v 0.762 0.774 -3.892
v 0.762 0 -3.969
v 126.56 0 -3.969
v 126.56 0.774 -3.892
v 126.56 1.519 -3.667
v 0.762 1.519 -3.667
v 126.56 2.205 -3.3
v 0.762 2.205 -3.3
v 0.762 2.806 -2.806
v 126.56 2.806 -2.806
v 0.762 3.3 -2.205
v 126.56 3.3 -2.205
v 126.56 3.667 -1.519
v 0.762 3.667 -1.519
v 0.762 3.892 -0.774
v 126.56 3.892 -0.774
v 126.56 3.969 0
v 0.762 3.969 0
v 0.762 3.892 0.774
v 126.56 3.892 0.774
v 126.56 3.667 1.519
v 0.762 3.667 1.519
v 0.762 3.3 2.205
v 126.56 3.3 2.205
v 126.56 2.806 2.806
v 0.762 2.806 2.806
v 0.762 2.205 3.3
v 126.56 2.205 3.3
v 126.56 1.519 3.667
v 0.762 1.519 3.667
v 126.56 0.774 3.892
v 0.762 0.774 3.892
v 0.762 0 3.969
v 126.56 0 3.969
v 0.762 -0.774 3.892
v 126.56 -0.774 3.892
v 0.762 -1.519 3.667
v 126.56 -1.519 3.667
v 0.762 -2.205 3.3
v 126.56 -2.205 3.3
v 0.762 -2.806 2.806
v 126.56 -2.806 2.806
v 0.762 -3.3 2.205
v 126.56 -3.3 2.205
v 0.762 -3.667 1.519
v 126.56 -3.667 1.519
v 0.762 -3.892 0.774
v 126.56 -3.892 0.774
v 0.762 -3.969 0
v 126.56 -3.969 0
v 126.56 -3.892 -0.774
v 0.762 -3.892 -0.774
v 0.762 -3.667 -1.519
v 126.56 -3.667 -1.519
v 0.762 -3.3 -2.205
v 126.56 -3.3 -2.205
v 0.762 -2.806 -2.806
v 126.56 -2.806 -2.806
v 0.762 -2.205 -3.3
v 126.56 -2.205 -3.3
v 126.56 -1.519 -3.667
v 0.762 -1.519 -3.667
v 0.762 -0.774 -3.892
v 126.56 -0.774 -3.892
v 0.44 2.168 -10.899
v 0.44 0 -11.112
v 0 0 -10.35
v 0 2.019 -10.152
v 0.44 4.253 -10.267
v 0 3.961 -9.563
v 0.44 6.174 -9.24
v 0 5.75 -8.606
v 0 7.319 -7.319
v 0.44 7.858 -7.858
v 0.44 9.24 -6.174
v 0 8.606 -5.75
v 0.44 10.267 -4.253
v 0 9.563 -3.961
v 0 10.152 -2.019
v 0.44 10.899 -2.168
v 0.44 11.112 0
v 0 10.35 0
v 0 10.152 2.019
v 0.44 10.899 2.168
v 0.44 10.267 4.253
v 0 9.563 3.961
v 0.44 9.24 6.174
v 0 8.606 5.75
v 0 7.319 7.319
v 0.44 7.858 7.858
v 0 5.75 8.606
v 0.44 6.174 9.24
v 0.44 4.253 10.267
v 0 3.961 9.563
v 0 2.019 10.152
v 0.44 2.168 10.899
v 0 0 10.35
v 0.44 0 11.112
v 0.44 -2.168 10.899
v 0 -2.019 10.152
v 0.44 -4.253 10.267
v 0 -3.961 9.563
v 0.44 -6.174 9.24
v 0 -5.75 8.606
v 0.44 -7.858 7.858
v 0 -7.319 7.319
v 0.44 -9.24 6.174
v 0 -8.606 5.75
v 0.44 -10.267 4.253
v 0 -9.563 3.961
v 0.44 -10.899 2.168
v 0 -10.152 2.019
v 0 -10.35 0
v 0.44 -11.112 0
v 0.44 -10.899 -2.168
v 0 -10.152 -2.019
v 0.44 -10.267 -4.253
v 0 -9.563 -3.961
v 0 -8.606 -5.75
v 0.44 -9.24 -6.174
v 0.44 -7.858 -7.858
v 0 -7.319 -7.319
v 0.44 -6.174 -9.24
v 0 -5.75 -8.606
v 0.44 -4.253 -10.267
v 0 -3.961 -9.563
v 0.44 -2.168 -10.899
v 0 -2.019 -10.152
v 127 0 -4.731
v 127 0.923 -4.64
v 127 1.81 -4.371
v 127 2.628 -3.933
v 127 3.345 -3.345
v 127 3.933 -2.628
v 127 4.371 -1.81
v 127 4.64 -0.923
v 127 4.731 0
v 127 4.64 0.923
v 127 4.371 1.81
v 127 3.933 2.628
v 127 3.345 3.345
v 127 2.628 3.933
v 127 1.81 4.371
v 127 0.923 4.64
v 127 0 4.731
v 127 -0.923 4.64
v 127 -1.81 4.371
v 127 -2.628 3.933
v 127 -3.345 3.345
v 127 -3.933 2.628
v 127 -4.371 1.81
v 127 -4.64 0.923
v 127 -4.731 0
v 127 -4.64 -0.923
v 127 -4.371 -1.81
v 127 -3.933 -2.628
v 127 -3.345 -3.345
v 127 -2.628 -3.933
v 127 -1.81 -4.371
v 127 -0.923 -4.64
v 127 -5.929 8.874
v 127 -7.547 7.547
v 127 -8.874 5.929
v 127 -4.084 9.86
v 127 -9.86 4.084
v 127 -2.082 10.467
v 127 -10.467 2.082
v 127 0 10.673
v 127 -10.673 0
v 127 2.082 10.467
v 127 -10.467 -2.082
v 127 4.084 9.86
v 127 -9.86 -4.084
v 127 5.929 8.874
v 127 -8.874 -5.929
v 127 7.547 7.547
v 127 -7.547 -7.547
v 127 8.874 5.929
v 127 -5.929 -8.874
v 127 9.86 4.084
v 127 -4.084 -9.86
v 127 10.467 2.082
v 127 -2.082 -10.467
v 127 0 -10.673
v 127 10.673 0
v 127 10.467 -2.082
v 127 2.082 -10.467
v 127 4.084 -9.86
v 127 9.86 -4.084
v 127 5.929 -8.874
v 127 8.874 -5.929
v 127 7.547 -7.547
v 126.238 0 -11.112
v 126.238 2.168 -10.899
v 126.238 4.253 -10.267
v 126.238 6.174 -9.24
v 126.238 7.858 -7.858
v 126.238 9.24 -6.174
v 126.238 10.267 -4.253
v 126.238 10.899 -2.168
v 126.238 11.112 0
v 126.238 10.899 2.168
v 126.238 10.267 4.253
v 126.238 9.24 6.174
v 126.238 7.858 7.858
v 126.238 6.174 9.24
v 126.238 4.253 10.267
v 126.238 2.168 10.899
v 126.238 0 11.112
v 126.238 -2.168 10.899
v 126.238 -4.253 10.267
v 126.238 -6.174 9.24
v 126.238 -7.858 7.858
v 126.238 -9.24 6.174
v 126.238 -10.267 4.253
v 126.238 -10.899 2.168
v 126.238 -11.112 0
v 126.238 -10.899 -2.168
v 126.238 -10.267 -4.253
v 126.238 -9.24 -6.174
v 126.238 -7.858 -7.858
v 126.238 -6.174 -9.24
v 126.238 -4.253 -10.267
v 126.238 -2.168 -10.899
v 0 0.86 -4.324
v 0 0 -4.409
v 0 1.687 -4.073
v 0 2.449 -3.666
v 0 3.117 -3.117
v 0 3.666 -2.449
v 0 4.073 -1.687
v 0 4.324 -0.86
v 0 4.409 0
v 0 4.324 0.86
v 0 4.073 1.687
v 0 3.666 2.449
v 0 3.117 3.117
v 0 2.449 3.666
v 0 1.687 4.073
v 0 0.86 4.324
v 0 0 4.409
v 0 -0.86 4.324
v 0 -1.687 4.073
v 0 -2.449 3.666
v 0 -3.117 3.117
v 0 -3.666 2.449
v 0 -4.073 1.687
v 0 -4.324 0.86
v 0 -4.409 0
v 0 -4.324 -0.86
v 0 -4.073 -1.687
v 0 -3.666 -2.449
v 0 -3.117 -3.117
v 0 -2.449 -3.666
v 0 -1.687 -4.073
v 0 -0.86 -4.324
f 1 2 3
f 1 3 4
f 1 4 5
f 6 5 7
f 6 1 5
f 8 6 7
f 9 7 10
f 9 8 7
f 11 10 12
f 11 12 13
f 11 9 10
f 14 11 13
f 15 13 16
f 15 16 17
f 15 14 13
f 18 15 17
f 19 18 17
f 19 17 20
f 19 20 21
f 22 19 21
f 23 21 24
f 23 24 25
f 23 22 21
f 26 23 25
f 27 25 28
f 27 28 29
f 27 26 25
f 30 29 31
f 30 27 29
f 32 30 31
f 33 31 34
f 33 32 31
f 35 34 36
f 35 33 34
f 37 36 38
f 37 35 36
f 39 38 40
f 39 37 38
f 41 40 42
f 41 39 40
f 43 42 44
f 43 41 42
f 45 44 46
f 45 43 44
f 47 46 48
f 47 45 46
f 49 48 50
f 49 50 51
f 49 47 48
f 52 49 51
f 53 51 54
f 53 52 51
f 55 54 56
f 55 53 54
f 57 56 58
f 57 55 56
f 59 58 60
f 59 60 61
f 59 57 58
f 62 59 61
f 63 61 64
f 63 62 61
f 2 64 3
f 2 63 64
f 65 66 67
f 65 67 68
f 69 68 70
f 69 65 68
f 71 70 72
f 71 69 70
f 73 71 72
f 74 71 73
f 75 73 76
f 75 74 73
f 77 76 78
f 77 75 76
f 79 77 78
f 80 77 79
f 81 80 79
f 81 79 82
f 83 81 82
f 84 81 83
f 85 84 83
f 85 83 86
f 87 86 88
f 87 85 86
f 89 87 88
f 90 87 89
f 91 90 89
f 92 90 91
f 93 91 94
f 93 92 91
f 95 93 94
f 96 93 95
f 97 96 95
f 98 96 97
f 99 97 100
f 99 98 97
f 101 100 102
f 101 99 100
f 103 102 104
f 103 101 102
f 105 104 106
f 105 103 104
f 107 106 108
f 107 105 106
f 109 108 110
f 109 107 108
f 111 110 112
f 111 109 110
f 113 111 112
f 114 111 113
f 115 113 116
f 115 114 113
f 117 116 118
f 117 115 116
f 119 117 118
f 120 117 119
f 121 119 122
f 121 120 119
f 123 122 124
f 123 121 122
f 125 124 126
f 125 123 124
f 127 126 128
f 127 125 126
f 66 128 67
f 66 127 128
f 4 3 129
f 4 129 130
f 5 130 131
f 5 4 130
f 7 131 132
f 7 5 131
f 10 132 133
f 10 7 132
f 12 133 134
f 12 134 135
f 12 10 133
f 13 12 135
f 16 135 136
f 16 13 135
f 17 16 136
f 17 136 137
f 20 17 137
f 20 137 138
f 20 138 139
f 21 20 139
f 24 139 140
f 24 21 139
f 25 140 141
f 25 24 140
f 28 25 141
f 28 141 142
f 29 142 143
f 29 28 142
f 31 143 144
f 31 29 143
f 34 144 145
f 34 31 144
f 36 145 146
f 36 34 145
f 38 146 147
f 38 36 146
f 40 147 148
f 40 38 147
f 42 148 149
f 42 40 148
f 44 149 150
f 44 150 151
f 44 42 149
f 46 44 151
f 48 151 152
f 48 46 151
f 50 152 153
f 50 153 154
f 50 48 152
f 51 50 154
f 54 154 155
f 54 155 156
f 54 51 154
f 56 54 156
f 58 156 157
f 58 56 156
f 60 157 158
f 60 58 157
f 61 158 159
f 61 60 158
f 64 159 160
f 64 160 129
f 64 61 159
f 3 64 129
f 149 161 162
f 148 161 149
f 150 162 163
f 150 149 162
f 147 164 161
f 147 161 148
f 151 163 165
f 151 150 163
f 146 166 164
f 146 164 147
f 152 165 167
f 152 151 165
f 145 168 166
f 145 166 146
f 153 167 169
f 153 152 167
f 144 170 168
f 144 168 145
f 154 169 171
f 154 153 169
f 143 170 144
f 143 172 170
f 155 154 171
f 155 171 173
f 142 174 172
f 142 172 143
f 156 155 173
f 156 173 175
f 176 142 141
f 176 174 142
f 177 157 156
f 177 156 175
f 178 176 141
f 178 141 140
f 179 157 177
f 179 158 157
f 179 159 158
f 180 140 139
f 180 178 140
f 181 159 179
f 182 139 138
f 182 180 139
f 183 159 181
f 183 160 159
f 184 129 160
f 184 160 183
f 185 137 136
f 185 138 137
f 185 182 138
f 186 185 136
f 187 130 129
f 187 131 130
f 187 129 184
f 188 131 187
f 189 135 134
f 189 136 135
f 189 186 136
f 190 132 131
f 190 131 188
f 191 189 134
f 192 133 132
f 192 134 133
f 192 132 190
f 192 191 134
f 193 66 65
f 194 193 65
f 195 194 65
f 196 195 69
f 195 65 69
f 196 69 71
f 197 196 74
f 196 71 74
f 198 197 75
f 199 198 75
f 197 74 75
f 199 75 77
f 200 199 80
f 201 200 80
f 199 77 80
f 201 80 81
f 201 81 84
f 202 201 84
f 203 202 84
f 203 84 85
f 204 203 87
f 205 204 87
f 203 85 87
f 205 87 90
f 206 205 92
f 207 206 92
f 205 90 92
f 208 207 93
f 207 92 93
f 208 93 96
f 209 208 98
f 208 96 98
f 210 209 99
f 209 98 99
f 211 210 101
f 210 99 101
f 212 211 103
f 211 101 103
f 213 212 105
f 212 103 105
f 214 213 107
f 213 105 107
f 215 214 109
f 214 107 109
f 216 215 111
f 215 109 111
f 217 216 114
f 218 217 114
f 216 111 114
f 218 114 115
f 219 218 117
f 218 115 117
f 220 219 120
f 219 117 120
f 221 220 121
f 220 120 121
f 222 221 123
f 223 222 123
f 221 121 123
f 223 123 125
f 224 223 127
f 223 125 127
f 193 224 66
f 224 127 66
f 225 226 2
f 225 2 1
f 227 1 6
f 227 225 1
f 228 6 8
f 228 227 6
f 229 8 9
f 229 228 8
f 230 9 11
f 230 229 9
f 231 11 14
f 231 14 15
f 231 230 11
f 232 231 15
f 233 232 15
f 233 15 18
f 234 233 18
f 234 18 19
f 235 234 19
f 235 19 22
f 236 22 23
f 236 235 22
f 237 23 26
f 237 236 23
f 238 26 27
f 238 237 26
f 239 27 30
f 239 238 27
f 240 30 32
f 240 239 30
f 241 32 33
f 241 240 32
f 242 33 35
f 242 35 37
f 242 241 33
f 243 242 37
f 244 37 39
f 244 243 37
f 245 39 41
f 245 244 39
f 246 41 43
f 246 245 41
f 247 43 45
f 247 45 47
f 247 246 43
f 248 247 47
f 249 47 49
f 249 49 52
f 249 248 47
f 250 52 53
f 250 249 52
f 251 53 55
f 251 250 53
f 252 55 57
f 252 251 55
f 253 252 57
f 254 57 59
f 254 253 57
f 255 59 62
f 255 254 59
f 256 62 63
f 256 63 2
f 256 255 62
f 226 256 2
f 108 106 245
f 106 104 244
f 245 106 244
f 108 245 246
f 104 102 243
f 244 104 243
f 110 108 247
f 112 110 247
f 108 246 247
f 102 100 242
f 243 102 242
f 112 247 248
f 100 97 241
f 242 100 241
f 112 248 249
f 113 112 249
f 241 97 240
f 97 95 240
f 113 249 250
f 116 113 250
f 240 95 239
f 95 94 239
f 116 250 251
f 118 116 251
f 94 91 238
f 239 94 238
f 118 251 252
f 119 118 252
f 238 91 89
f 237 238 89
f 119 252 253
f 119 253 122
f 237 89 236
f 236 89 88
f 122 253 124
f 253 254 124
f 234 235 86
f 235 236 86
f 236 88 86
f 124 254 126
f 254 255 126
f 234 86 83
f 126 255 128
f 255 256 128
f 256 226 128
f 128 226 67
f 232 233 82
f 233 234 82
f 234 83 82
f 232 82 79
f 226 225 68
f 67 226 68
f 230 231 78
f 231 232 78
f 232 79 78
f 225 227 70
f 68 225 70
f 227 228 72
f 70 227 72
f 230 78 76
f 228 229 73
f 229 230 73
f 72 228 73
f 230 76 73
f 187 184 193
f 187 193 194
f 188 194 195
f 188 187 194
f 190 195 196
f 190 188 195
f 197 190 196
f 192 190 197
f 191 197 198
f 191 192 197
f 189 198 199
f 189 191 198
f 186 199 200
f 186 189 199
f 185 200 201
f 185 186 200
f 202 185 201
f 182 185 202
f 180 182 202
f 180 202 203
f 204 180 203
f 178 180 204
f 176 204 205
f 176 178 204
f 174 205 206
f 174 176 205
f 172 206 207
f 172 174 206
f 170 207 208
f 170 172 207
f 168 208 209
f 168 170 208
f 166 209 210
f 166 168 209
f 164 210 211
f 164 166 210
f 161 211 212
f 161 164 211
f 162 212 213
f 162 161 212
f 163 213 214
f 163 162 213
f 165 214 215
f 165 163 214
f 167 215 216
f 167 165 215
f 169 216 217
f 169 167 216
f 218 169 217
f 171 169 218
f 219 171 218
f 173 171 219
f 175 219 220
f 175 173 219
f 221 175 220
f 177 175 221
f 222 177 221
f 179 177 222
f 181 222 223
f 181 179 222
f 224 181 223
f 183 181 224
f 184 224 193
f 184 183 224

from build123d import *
from OCP.BRepFilletAPI import BRepFilletAPI_MakeChamfer

# Parameters (mm, degrees)
SKETCH1_R           = 11.1125
SKETCH1_R_2         = 3.96875
BOSS_EXTRUDE1_DEPTH = 127
CHAMFER1_SIZE       = 0.762
CHAMFER1_SIZE2      = 0.439940905


with BuildPart() as part:
    # Sketch1 → Boss-Extrude1 (new body)
    with BuildSketch(Plane(origin=(0, 0, 0), x_dir=(0, 0, -1), z_dir=(1, 0, 0))):
        Circle(SKETCH1_R)
        Circle(SKETCH1_R_2, mode=Mode.SUBTRACT)
    extrude(amount=BOSS_EXTRUDE1_DEPTH)

    # Chamfer1: one chamfer whose edges measure the first distance from different faces: ONE call of the kernel's chamfer builder (chamfer() names one face for all edges)
    chamfer1_edges_1 = [part.edges().sort_by_distance(p)[0] for p in [
        (0, 0, 11.1125),
    ]]
    chamfer1_side_1 = [part.faces().sort_by_distance(p)[0] for p in [
        (0, 0, 10.798191036),
    ]]
    chamfer1_edges_2 = [part.edges().sort_by_distance(p)[0] for p in [
        (127, 0, 11.1125),
    ]]
    chamfer1_side_2 = [part.faces().sort_by_distance(p)[0] for p in [
        (63.5, 0, 11.1125),
    ]]
    chamfer1_edges_3 = [part.edges().sort_by_distance(p)[0] for p in [
        (0, 0, 3.96875),
    ]]
    chamfer1_side_3 = [part.faces().sort_by_distance(p)[0] for p in [
        (63.5, 0, 3.96875),
    ]]
    chamfer1_edges_4 = [part.edges().sort_by_distance(p)[0] for p in [
        (127, 0, 3.96875),
    ]]
    chamfer1_side_4 = [part.faces().sort_by_distance(p)[0] for p in [
        (127, 0, 10.798191036),
    ]]
    chamfer1 = BRepFilletAPI_MakeChamfer(part.part.solid().wrapped)
    for e in chamfer1_edges_1:
        chamfer1.Add(CHAMFER1_SIZE, CHAMFER1_SIZE2, e.wrapped, chamfer1_side_1[0].wrapped)  # the first distance lies on this face
    for e in chamfer1_edges_2:
        chamfer1.Add(CHAMFER1_SIZE, CHAMFER1_SIZE2, e.wrapped, chamfer1_side_2[0].wrapped)  # the first distance lies on this face
    for e in chamfer1_edges_3:
        chamfer1.Add(CHAMFER1_SIZE, CHAMFER1_SIZE2, e.wrapped, chamfer1_side_3[0].wrapped)  # the first distance lies on this face
    for e in chamfer1_edges_4:
        chamfer1.Add(CHAMFER1_SIZE, CHAMFER1_SIZE2, e.wrapped, chamfer1_side_4[0].wrapped)  # the first distance lies on this face
    add(Compound.cast(chamfer1.Shape()), mode=Mode.REPLACE)


solid = part.part
